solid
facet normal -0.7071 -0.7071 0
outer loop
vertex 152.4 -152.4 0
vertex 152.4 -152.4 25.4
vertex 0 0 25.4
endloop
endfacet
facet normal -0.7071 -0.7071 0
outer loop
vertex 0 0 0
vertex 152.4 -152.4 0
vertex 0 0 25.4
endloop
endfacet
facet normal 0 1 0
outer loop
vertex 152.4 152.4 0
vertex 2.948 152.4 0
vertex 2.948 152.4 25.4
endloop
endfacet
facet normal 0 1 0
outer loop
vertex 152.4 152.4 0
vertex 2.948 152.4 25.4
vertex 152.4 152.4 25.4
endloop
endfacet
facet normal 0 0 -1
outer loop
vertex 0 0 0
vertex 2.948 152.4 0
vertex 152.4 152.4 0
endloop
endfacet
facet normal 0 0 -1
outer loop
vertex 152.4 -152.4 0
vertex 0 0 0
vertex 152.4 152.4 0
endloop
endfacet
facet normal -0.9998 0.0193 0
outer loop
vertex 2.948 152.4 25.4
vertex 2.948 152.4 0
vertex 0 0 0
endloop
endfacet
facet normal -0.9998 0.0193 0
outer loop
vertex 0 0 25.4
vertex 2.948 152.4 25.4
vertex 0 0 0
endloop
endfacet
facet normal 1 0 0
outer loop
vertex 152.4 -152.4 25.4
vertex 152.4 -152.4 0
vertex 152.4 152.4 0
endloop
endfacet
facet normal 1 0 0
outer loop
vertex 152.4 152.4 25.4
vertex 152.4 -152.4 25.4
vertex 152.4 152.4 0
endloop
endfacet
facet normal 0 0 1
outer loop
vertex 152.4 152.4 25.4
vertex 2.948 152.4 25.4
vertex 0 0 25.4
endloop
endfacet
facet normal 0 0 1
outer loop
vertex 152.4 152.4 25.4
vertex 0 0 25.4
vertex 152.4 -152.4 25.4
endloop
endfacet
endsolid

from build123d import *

# Parameters (mm, degrees)
F0_W     = 304.8
F0_H     = 304.8
F1_DEPTH = 25.4
F3_DEPTH = 25.4
F5_DEPTH = 25.4


with BuildPart() as f1:
    # F0 (on Top) → F1 (new body)
    with BuildSketch(Plane.XY):
        Rectangle(F0_W, F0_H)
    extrude(amount=F1_DEPTH)

    # F2 (on face) → F3 (cut)
    with BuildSketch(Plane.XY.offset(25.4)):
        Polygon((152.4, -152.4), (0, 0), (-152.4, -152.4), align=None)
    extrude(amount=-F3_DEPTH, mode=Mode.SUBTRACT)

    # F4 (on face) → F5 (cut)
    with BuildSketch(Plane(origin=(0, 0, 0), x_dir=(1, 0, 0), z_dir=(0, 0, -1))):
        Polygon((2.948233, -152.4), (0, 0), (-152.4, 152.4), (-152.4, -152.4), align=None)
    extrude(amount=-F5_DEPTH, mode=Mode.SUBTRACT)


solid = f1.part
